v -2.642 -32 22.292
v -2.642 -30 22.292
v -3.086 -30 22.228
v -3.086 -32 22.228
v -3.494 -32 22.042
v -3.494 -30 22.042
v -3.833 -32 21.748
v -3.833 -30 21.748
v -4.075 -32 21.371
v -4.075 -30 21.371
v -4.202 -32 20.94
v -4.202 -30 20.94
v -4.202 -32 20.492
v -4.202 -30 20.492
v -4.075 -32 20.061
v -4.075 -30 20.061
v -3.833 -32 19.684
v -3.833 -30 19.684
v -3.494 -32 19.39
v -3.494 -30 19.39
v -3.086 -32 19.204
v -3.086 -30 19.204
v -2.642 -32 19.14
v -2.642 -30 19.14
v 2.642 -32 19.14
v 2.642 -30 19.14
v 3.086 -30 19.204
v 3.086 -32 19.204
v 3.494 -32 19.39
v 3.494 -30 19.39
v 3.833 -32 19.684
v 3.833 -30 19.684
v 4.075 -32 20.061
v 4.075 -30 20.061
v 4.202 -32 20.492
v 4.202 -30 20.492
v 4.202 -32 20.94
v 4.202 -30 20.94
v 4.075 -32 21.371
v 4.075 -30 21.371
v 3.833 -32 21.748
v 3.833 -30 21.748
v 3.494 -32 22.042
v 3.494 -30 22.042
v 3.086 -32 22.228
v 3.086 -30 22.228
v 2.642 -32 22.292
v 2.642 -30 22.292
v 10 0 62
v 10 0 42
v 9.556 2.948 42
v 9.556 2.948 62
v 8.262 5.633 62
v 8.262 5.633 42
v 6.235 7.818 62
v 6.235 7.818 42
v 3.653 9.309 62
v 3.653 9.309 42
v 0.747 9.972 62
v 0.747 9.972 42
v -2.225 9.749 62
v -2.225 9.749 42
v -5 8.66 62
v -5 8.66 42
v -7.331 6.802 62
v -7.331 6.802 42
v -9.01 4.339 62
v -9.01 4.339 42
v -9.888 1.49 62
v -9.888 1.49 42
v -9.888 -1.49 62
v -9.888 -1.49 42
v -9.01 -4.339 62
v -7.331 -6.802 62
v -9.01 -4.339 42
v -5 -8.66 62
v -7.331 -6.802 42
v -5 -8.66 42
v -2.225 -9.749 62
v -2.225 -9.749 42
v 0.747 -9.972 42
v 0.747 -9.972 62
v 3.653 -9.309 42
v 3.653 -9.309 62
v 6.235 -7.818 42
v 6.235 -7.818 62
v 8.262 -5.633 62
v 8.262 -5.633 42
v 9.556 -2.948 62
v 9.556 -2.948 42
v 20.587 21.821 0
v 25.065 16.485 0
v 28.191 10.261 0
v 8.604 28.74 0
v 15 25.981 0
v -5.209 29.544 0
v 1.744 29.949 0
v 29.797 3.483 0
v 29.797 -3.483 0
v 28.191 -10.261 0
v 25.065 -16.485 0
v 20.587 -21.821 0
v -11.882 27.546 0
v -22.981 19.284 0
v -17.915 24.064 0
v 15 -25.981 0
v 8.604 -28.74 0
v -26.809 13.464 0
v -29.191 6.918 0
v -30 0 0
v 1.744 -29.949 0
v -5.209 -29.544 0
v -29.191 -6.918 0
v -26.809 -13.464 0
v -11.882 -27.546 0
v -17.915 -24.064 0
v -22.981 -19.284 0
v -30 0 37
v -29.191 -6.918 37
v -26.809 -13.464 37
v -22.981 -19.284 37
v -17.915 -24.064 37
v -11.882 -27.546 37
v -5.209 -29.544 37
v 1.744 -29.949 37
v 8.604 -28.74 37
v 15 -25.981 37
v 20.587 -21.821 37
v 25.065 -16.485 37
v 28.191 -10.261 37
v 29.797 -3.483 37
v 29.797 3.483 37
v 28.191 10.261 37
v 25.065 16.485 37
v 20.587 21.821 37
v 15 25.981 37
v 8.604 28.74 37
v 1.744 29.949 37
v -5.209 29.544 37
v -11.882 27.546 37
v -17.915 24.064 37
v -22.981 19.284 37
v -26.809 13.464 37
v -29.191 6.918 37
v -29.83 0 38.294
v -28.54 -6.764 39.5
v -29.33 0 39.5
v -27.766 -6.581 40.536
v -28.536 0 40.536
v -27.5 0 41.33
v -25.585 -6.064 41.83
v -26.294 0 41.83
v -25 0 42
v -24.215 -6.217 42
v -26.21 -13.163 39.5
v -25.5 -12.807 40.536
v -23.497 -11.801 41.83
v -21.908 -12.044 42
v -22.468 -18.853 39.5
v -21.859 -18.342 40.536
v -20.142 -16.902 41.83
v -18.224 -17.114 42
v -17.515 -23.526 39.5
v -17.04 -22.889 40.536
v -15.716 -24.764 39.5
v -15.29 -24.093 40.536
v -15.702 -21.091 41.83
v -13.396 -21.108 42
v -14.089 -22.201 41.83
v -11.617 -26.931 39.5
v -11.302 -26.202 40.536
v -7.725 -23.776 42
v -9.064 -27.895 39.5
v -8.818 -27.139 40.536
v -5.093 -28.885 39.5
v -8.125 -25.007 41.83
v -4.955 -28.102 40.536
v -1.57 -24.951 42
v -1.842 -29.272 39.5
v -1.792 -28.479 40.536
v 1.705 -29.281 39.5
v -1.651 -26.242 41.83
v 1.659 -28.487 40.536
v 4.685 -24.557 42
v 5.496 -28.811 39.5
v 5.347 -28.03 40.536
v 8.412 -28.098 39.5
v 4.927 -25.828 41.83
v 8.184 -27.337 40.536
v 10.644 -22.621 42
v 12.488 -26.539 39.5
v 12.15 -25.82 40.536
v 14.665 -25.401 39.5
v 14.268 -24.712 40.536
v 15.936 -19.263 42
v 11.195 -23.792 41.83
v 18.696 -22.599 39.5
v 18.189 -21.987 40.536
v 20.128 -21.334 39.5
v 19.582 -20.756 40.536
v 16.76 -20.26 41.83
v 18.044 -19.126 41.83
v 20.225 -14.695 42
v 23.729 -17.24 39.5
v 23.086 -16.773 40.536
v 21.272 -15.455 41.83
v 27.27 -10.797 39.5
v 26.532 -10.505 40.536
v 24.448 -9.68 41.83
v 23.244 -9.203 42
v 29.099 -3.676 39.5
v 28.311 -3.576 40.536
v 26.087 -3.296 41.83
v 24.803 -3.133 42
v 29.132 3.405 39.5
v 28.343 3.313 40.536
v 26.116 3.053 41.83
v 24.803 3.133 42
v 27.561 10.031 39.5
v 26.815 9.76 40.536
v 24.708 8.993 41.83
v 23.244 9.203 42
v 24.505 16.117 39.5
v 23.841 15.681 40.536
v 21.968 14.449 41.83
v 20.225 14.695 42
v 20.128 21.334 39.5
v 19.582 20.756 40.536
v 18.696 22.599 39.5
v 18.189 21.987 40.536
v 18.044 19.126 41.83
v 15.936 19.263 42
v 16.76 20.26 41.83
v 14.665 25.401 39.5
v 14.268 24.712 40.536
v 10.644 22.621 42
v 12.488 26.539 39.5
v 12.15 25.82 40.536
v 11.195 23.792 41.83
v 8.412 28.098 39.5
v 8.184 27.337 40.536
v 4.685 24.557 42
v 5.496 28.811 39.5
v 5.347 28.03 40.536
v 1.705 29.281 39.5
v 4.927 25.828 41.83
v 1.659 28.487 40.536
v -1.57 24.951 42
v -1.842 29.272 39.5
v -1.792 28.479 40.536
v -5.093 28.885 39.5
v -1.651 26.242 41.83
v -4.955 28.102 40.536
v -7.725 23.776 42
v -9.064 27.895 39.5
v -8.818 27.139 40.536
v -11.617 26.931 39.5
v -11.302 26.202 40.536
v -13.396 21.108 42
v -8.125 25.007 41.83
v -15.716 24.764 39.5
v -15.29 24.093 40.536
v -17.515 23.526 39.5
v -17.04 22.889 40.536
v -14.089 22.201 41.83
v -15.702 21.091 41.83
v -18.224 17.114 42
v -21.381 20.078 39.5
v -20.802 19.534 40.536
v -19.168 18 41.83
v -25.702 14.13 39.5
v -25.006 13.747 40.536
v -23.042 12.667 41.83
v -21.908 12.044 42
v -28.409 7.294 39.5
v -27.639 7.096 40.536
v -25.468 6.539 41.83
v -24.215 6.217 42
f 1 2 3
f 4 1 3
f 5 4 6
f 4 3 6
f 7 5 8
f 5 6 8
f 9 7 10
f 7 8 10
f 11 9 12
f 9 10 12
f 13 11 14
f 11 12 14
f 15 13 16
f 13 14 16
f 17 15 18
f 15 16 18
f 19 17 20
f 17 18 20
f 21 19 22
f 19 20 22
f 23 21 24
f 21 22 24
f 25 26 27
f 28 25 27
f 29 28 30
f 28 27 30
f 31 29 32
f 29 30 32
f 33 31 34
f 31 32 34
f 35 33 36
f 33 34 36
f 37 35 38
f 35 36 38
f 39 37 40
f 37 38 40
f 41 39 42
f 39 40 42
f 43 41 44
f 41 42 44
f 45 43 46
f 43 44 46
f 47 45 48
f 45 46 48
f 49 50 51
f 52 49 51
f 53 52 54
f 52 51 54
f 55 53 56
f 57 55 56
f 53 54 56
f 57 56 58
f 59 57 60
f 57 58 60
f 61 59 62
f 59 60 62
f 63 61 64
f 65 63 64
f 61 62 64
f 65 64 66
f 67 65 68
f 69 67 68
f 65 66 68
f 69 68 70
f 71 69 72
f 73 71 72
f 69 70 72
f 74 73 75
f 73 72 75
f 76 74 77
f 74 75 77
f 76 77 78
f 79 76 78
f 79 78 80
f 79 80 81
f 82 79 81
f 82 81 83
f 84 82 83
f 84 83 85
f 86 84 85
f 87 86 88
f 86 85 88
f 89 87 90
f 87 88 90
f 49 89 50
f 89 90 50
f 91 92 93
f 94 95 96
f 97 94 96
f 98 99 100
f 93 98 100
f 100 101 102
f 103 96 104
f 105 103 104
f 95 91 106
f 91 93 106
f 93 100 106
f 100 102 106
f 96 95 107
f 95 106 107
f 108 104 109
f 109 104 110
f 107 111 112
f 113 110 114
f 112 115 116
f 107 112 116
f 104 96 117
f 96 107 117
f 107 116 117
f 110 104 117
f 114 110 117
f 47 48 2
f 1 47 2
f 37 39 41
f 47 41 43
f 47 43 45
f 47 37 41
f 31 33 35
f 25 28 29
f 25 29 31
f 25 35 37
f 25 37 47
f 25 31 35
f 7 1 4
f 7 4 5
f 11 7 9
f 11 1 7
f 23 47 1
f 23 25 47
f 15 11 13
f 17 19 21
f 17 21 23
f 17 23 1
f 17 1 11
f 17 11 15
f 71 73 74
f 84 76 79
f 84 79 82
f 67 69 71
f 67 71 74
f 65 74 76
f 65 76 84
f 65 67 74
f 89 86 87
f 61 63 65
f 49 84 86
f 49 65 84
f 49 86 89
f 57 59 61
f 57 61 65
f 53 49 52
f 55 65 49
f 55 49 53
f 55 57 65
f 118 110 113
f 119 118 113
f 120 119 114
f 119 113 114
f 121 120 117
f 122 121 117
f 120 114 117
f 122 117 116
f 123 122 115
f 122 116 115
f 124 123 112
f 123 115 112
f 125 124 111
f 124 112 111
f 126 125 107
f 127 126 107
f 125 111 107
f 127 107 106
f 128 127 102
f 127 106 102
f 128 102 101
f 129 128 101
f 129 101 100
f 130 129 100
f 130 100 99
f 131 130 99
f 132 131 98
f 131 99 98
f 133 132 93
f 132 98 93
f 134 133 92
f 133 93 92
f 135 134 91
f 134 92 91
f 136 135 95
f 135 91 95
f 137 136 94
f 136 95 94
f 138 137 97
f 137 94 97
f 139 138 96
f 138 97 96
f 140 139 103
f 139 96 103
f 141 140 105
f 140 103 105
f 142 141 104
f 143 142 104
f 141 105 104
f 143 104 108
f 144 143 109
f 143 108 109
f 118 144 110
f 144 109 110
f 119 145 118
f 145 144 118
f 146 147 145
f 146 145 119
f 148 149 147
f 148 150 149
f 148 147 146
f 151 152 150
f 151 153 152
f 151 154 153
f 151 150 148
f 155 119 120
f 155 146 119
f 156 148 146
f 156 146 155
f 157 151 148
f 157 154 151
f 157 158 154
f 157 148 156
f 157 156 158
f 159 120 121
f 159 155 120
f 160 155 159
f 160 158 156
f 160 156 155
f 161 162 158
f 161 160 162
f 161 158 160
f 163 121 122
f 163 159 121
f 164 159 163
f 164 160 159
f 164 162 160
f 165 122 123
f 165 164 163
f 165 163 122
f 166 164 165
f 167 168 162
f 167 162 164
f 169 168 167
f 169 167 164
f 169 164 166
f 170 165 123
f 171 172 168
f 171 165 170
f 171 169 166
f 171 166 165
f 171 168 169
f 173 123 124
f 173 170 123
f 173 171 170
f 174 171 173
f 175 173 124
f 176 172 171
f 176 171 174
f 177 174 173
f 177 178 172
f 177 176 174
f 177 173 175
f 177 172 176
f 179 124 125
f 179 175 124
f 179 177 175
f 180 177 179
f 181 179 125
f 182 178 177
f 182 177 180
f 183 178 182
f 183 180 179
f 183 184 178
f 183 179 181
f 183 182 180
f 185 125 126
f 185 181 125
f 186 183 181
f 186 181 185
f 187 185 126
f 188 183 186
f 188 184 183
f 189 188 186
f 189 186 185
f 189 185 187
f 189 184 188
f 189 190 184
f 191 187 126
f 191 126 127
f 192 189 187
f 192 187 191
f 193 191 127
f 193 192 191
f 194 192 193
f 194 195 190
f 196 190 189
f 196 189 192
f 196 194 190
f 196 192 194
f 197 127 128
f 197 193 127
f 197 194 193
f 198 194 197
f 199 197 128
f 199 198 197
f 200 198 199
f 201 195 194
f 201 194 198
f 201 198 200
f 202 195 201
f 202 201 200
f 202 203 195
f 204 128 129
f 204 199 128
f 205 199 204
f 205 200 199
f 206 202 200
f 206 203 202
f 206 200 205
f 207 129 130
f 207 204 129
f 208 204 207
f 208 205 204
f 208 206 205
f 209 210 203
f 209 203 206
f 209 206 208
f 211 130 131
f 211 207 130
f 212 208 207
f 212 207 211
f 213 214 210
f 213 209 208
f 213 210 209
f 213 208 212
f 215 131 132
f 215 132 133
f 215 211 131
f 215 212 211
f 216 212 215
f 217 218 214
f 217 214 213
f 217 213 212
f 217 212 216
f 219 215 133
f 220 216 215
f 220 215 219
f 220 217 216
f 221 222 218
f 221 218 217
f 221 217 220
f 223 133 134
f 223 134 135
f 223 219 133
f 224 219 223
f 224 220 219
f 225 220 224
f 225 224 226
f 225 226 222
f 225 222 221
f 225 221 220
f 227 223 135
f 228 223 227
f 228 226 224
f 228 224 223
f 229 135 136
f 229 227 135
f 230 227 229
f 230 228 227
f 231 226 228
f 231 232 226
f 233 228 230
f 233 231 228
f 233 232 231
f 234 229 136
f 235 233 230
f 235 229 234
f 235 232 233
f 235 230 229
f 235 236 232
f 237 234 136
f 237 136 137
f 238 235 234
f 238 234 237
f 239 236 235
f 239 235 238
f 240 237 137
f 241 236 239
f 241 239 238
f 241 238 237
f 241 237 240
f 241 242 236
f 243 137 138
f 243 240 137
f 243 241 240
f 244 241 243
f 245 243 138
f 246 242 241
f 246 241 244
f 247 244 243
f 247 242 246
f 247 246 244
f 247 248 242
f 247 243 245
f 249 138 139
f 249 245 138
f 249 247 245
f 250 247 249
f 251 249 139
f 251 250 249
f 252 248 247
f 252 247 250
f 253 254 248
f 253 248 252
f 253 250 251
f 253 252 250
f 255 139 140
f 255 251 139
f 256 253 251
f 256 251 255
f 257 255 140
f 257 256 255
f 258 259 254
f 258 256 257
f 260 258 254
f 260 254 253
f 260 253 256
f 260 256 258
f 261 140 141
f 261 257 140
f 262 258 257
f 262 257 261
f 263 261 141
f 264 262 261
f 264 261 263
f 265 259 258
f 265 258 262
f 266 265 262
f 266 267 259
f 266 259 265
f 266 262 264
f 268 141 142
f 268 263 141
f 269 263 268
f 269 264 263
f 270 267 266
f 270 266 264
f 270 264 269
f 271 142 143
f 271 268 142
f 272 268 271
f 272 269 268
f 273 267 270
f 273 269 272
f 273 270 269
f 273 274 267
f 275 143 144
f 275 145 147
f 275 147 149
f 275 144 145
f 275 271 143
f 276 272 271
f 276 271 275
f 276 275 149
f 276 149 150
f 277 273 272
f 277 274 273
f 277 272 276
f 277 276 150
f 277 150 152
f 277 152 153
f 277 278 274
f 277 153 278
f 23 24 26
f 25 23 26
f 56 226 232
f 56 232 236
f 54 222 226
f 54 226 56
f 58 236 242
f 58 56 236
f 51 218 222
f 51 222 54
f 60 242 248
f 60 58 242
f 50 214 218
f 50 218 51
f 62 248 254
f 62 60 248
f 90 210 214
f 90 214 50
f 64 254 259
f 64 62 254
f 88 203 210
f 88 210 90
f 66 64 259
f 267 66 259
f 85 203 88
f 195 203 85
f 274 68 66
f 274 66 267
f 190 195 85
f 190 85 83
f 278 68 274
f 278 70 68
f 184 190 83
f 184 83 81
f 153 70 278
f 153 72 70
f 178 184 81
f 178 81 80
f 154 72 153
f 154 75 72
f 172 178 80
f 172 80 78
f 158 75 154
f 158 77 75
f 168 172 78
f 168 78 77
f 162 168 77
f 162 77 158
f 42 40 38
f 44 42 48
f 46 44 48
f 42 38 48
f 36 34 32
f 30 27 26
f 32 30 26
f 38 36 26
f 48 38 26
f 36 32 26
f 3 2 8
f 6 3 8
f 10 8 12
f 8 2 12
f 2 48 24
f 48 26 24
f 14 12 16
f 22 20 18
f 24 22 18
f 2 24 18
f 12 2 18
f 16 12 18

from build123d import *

# Parameters (mm, degrees)
SKETCH1_R           = 30
BOSS_EXTRUDE1_DEPTH = 42
SKETCH3_R           = 10
BOSS_EXTRUDE2_DEPTH = 20
FILLET1_R           = 5
BOSS_EXTRUDE6_DEPTH = 2


with BuildPart() as part:
    # Sketch1 → Boss-Extrude1 (new body)
    with BuildSketch(Plane.XY):
        Circle(SKETCH1_R)
    extrude(amount=BOSS_EXTRUDE1_DEPTH)

    # Sketch3 → Boss-Extrude2 (add)
    with BuildSketch(Plane.XY.offset(42)):
        Circle(SKETCH3_R)
    extrude(amount=BOSS_EXTRUDE2_DEPTH)

    # Fillet1
    fillet1_edges = [part.edges().sort_by_distance(p)[0] for p in [
        (-30, 0, 42),
    ]]
    fillet(fillet1_edges, radius=FILLET1_R)


with BuildPart() as body_2:
    # Sketch9 → Boss-Extrude6 (new body)
    with BuildSketch(Plane(origin=(0, -30, 0), x_dir=(1, 0, 0), z_dir=(0, 1, 0))):
        with BuildLine():
            Line((-2.641982759, -19.140114943), (2.641982759, -19.140114943))
            ThreePointArc((2.641982759, -19.140114943), (4.217902299, -20.716034483), (2.641982759, -22.291954023))
            Line((2.641982759, -22.291954023), (-2.641982759, -22.291954023))
            ThreePointArc((-2.641982759, -22.291954023), (-4.217902299, -20.716034483), (-2.641982759, -19.140114943))
        make_face()
    extrude(amount=-BOSS_EXTRUDE6_DEPTH)


solid = Compound([part.part, body_2.part])
